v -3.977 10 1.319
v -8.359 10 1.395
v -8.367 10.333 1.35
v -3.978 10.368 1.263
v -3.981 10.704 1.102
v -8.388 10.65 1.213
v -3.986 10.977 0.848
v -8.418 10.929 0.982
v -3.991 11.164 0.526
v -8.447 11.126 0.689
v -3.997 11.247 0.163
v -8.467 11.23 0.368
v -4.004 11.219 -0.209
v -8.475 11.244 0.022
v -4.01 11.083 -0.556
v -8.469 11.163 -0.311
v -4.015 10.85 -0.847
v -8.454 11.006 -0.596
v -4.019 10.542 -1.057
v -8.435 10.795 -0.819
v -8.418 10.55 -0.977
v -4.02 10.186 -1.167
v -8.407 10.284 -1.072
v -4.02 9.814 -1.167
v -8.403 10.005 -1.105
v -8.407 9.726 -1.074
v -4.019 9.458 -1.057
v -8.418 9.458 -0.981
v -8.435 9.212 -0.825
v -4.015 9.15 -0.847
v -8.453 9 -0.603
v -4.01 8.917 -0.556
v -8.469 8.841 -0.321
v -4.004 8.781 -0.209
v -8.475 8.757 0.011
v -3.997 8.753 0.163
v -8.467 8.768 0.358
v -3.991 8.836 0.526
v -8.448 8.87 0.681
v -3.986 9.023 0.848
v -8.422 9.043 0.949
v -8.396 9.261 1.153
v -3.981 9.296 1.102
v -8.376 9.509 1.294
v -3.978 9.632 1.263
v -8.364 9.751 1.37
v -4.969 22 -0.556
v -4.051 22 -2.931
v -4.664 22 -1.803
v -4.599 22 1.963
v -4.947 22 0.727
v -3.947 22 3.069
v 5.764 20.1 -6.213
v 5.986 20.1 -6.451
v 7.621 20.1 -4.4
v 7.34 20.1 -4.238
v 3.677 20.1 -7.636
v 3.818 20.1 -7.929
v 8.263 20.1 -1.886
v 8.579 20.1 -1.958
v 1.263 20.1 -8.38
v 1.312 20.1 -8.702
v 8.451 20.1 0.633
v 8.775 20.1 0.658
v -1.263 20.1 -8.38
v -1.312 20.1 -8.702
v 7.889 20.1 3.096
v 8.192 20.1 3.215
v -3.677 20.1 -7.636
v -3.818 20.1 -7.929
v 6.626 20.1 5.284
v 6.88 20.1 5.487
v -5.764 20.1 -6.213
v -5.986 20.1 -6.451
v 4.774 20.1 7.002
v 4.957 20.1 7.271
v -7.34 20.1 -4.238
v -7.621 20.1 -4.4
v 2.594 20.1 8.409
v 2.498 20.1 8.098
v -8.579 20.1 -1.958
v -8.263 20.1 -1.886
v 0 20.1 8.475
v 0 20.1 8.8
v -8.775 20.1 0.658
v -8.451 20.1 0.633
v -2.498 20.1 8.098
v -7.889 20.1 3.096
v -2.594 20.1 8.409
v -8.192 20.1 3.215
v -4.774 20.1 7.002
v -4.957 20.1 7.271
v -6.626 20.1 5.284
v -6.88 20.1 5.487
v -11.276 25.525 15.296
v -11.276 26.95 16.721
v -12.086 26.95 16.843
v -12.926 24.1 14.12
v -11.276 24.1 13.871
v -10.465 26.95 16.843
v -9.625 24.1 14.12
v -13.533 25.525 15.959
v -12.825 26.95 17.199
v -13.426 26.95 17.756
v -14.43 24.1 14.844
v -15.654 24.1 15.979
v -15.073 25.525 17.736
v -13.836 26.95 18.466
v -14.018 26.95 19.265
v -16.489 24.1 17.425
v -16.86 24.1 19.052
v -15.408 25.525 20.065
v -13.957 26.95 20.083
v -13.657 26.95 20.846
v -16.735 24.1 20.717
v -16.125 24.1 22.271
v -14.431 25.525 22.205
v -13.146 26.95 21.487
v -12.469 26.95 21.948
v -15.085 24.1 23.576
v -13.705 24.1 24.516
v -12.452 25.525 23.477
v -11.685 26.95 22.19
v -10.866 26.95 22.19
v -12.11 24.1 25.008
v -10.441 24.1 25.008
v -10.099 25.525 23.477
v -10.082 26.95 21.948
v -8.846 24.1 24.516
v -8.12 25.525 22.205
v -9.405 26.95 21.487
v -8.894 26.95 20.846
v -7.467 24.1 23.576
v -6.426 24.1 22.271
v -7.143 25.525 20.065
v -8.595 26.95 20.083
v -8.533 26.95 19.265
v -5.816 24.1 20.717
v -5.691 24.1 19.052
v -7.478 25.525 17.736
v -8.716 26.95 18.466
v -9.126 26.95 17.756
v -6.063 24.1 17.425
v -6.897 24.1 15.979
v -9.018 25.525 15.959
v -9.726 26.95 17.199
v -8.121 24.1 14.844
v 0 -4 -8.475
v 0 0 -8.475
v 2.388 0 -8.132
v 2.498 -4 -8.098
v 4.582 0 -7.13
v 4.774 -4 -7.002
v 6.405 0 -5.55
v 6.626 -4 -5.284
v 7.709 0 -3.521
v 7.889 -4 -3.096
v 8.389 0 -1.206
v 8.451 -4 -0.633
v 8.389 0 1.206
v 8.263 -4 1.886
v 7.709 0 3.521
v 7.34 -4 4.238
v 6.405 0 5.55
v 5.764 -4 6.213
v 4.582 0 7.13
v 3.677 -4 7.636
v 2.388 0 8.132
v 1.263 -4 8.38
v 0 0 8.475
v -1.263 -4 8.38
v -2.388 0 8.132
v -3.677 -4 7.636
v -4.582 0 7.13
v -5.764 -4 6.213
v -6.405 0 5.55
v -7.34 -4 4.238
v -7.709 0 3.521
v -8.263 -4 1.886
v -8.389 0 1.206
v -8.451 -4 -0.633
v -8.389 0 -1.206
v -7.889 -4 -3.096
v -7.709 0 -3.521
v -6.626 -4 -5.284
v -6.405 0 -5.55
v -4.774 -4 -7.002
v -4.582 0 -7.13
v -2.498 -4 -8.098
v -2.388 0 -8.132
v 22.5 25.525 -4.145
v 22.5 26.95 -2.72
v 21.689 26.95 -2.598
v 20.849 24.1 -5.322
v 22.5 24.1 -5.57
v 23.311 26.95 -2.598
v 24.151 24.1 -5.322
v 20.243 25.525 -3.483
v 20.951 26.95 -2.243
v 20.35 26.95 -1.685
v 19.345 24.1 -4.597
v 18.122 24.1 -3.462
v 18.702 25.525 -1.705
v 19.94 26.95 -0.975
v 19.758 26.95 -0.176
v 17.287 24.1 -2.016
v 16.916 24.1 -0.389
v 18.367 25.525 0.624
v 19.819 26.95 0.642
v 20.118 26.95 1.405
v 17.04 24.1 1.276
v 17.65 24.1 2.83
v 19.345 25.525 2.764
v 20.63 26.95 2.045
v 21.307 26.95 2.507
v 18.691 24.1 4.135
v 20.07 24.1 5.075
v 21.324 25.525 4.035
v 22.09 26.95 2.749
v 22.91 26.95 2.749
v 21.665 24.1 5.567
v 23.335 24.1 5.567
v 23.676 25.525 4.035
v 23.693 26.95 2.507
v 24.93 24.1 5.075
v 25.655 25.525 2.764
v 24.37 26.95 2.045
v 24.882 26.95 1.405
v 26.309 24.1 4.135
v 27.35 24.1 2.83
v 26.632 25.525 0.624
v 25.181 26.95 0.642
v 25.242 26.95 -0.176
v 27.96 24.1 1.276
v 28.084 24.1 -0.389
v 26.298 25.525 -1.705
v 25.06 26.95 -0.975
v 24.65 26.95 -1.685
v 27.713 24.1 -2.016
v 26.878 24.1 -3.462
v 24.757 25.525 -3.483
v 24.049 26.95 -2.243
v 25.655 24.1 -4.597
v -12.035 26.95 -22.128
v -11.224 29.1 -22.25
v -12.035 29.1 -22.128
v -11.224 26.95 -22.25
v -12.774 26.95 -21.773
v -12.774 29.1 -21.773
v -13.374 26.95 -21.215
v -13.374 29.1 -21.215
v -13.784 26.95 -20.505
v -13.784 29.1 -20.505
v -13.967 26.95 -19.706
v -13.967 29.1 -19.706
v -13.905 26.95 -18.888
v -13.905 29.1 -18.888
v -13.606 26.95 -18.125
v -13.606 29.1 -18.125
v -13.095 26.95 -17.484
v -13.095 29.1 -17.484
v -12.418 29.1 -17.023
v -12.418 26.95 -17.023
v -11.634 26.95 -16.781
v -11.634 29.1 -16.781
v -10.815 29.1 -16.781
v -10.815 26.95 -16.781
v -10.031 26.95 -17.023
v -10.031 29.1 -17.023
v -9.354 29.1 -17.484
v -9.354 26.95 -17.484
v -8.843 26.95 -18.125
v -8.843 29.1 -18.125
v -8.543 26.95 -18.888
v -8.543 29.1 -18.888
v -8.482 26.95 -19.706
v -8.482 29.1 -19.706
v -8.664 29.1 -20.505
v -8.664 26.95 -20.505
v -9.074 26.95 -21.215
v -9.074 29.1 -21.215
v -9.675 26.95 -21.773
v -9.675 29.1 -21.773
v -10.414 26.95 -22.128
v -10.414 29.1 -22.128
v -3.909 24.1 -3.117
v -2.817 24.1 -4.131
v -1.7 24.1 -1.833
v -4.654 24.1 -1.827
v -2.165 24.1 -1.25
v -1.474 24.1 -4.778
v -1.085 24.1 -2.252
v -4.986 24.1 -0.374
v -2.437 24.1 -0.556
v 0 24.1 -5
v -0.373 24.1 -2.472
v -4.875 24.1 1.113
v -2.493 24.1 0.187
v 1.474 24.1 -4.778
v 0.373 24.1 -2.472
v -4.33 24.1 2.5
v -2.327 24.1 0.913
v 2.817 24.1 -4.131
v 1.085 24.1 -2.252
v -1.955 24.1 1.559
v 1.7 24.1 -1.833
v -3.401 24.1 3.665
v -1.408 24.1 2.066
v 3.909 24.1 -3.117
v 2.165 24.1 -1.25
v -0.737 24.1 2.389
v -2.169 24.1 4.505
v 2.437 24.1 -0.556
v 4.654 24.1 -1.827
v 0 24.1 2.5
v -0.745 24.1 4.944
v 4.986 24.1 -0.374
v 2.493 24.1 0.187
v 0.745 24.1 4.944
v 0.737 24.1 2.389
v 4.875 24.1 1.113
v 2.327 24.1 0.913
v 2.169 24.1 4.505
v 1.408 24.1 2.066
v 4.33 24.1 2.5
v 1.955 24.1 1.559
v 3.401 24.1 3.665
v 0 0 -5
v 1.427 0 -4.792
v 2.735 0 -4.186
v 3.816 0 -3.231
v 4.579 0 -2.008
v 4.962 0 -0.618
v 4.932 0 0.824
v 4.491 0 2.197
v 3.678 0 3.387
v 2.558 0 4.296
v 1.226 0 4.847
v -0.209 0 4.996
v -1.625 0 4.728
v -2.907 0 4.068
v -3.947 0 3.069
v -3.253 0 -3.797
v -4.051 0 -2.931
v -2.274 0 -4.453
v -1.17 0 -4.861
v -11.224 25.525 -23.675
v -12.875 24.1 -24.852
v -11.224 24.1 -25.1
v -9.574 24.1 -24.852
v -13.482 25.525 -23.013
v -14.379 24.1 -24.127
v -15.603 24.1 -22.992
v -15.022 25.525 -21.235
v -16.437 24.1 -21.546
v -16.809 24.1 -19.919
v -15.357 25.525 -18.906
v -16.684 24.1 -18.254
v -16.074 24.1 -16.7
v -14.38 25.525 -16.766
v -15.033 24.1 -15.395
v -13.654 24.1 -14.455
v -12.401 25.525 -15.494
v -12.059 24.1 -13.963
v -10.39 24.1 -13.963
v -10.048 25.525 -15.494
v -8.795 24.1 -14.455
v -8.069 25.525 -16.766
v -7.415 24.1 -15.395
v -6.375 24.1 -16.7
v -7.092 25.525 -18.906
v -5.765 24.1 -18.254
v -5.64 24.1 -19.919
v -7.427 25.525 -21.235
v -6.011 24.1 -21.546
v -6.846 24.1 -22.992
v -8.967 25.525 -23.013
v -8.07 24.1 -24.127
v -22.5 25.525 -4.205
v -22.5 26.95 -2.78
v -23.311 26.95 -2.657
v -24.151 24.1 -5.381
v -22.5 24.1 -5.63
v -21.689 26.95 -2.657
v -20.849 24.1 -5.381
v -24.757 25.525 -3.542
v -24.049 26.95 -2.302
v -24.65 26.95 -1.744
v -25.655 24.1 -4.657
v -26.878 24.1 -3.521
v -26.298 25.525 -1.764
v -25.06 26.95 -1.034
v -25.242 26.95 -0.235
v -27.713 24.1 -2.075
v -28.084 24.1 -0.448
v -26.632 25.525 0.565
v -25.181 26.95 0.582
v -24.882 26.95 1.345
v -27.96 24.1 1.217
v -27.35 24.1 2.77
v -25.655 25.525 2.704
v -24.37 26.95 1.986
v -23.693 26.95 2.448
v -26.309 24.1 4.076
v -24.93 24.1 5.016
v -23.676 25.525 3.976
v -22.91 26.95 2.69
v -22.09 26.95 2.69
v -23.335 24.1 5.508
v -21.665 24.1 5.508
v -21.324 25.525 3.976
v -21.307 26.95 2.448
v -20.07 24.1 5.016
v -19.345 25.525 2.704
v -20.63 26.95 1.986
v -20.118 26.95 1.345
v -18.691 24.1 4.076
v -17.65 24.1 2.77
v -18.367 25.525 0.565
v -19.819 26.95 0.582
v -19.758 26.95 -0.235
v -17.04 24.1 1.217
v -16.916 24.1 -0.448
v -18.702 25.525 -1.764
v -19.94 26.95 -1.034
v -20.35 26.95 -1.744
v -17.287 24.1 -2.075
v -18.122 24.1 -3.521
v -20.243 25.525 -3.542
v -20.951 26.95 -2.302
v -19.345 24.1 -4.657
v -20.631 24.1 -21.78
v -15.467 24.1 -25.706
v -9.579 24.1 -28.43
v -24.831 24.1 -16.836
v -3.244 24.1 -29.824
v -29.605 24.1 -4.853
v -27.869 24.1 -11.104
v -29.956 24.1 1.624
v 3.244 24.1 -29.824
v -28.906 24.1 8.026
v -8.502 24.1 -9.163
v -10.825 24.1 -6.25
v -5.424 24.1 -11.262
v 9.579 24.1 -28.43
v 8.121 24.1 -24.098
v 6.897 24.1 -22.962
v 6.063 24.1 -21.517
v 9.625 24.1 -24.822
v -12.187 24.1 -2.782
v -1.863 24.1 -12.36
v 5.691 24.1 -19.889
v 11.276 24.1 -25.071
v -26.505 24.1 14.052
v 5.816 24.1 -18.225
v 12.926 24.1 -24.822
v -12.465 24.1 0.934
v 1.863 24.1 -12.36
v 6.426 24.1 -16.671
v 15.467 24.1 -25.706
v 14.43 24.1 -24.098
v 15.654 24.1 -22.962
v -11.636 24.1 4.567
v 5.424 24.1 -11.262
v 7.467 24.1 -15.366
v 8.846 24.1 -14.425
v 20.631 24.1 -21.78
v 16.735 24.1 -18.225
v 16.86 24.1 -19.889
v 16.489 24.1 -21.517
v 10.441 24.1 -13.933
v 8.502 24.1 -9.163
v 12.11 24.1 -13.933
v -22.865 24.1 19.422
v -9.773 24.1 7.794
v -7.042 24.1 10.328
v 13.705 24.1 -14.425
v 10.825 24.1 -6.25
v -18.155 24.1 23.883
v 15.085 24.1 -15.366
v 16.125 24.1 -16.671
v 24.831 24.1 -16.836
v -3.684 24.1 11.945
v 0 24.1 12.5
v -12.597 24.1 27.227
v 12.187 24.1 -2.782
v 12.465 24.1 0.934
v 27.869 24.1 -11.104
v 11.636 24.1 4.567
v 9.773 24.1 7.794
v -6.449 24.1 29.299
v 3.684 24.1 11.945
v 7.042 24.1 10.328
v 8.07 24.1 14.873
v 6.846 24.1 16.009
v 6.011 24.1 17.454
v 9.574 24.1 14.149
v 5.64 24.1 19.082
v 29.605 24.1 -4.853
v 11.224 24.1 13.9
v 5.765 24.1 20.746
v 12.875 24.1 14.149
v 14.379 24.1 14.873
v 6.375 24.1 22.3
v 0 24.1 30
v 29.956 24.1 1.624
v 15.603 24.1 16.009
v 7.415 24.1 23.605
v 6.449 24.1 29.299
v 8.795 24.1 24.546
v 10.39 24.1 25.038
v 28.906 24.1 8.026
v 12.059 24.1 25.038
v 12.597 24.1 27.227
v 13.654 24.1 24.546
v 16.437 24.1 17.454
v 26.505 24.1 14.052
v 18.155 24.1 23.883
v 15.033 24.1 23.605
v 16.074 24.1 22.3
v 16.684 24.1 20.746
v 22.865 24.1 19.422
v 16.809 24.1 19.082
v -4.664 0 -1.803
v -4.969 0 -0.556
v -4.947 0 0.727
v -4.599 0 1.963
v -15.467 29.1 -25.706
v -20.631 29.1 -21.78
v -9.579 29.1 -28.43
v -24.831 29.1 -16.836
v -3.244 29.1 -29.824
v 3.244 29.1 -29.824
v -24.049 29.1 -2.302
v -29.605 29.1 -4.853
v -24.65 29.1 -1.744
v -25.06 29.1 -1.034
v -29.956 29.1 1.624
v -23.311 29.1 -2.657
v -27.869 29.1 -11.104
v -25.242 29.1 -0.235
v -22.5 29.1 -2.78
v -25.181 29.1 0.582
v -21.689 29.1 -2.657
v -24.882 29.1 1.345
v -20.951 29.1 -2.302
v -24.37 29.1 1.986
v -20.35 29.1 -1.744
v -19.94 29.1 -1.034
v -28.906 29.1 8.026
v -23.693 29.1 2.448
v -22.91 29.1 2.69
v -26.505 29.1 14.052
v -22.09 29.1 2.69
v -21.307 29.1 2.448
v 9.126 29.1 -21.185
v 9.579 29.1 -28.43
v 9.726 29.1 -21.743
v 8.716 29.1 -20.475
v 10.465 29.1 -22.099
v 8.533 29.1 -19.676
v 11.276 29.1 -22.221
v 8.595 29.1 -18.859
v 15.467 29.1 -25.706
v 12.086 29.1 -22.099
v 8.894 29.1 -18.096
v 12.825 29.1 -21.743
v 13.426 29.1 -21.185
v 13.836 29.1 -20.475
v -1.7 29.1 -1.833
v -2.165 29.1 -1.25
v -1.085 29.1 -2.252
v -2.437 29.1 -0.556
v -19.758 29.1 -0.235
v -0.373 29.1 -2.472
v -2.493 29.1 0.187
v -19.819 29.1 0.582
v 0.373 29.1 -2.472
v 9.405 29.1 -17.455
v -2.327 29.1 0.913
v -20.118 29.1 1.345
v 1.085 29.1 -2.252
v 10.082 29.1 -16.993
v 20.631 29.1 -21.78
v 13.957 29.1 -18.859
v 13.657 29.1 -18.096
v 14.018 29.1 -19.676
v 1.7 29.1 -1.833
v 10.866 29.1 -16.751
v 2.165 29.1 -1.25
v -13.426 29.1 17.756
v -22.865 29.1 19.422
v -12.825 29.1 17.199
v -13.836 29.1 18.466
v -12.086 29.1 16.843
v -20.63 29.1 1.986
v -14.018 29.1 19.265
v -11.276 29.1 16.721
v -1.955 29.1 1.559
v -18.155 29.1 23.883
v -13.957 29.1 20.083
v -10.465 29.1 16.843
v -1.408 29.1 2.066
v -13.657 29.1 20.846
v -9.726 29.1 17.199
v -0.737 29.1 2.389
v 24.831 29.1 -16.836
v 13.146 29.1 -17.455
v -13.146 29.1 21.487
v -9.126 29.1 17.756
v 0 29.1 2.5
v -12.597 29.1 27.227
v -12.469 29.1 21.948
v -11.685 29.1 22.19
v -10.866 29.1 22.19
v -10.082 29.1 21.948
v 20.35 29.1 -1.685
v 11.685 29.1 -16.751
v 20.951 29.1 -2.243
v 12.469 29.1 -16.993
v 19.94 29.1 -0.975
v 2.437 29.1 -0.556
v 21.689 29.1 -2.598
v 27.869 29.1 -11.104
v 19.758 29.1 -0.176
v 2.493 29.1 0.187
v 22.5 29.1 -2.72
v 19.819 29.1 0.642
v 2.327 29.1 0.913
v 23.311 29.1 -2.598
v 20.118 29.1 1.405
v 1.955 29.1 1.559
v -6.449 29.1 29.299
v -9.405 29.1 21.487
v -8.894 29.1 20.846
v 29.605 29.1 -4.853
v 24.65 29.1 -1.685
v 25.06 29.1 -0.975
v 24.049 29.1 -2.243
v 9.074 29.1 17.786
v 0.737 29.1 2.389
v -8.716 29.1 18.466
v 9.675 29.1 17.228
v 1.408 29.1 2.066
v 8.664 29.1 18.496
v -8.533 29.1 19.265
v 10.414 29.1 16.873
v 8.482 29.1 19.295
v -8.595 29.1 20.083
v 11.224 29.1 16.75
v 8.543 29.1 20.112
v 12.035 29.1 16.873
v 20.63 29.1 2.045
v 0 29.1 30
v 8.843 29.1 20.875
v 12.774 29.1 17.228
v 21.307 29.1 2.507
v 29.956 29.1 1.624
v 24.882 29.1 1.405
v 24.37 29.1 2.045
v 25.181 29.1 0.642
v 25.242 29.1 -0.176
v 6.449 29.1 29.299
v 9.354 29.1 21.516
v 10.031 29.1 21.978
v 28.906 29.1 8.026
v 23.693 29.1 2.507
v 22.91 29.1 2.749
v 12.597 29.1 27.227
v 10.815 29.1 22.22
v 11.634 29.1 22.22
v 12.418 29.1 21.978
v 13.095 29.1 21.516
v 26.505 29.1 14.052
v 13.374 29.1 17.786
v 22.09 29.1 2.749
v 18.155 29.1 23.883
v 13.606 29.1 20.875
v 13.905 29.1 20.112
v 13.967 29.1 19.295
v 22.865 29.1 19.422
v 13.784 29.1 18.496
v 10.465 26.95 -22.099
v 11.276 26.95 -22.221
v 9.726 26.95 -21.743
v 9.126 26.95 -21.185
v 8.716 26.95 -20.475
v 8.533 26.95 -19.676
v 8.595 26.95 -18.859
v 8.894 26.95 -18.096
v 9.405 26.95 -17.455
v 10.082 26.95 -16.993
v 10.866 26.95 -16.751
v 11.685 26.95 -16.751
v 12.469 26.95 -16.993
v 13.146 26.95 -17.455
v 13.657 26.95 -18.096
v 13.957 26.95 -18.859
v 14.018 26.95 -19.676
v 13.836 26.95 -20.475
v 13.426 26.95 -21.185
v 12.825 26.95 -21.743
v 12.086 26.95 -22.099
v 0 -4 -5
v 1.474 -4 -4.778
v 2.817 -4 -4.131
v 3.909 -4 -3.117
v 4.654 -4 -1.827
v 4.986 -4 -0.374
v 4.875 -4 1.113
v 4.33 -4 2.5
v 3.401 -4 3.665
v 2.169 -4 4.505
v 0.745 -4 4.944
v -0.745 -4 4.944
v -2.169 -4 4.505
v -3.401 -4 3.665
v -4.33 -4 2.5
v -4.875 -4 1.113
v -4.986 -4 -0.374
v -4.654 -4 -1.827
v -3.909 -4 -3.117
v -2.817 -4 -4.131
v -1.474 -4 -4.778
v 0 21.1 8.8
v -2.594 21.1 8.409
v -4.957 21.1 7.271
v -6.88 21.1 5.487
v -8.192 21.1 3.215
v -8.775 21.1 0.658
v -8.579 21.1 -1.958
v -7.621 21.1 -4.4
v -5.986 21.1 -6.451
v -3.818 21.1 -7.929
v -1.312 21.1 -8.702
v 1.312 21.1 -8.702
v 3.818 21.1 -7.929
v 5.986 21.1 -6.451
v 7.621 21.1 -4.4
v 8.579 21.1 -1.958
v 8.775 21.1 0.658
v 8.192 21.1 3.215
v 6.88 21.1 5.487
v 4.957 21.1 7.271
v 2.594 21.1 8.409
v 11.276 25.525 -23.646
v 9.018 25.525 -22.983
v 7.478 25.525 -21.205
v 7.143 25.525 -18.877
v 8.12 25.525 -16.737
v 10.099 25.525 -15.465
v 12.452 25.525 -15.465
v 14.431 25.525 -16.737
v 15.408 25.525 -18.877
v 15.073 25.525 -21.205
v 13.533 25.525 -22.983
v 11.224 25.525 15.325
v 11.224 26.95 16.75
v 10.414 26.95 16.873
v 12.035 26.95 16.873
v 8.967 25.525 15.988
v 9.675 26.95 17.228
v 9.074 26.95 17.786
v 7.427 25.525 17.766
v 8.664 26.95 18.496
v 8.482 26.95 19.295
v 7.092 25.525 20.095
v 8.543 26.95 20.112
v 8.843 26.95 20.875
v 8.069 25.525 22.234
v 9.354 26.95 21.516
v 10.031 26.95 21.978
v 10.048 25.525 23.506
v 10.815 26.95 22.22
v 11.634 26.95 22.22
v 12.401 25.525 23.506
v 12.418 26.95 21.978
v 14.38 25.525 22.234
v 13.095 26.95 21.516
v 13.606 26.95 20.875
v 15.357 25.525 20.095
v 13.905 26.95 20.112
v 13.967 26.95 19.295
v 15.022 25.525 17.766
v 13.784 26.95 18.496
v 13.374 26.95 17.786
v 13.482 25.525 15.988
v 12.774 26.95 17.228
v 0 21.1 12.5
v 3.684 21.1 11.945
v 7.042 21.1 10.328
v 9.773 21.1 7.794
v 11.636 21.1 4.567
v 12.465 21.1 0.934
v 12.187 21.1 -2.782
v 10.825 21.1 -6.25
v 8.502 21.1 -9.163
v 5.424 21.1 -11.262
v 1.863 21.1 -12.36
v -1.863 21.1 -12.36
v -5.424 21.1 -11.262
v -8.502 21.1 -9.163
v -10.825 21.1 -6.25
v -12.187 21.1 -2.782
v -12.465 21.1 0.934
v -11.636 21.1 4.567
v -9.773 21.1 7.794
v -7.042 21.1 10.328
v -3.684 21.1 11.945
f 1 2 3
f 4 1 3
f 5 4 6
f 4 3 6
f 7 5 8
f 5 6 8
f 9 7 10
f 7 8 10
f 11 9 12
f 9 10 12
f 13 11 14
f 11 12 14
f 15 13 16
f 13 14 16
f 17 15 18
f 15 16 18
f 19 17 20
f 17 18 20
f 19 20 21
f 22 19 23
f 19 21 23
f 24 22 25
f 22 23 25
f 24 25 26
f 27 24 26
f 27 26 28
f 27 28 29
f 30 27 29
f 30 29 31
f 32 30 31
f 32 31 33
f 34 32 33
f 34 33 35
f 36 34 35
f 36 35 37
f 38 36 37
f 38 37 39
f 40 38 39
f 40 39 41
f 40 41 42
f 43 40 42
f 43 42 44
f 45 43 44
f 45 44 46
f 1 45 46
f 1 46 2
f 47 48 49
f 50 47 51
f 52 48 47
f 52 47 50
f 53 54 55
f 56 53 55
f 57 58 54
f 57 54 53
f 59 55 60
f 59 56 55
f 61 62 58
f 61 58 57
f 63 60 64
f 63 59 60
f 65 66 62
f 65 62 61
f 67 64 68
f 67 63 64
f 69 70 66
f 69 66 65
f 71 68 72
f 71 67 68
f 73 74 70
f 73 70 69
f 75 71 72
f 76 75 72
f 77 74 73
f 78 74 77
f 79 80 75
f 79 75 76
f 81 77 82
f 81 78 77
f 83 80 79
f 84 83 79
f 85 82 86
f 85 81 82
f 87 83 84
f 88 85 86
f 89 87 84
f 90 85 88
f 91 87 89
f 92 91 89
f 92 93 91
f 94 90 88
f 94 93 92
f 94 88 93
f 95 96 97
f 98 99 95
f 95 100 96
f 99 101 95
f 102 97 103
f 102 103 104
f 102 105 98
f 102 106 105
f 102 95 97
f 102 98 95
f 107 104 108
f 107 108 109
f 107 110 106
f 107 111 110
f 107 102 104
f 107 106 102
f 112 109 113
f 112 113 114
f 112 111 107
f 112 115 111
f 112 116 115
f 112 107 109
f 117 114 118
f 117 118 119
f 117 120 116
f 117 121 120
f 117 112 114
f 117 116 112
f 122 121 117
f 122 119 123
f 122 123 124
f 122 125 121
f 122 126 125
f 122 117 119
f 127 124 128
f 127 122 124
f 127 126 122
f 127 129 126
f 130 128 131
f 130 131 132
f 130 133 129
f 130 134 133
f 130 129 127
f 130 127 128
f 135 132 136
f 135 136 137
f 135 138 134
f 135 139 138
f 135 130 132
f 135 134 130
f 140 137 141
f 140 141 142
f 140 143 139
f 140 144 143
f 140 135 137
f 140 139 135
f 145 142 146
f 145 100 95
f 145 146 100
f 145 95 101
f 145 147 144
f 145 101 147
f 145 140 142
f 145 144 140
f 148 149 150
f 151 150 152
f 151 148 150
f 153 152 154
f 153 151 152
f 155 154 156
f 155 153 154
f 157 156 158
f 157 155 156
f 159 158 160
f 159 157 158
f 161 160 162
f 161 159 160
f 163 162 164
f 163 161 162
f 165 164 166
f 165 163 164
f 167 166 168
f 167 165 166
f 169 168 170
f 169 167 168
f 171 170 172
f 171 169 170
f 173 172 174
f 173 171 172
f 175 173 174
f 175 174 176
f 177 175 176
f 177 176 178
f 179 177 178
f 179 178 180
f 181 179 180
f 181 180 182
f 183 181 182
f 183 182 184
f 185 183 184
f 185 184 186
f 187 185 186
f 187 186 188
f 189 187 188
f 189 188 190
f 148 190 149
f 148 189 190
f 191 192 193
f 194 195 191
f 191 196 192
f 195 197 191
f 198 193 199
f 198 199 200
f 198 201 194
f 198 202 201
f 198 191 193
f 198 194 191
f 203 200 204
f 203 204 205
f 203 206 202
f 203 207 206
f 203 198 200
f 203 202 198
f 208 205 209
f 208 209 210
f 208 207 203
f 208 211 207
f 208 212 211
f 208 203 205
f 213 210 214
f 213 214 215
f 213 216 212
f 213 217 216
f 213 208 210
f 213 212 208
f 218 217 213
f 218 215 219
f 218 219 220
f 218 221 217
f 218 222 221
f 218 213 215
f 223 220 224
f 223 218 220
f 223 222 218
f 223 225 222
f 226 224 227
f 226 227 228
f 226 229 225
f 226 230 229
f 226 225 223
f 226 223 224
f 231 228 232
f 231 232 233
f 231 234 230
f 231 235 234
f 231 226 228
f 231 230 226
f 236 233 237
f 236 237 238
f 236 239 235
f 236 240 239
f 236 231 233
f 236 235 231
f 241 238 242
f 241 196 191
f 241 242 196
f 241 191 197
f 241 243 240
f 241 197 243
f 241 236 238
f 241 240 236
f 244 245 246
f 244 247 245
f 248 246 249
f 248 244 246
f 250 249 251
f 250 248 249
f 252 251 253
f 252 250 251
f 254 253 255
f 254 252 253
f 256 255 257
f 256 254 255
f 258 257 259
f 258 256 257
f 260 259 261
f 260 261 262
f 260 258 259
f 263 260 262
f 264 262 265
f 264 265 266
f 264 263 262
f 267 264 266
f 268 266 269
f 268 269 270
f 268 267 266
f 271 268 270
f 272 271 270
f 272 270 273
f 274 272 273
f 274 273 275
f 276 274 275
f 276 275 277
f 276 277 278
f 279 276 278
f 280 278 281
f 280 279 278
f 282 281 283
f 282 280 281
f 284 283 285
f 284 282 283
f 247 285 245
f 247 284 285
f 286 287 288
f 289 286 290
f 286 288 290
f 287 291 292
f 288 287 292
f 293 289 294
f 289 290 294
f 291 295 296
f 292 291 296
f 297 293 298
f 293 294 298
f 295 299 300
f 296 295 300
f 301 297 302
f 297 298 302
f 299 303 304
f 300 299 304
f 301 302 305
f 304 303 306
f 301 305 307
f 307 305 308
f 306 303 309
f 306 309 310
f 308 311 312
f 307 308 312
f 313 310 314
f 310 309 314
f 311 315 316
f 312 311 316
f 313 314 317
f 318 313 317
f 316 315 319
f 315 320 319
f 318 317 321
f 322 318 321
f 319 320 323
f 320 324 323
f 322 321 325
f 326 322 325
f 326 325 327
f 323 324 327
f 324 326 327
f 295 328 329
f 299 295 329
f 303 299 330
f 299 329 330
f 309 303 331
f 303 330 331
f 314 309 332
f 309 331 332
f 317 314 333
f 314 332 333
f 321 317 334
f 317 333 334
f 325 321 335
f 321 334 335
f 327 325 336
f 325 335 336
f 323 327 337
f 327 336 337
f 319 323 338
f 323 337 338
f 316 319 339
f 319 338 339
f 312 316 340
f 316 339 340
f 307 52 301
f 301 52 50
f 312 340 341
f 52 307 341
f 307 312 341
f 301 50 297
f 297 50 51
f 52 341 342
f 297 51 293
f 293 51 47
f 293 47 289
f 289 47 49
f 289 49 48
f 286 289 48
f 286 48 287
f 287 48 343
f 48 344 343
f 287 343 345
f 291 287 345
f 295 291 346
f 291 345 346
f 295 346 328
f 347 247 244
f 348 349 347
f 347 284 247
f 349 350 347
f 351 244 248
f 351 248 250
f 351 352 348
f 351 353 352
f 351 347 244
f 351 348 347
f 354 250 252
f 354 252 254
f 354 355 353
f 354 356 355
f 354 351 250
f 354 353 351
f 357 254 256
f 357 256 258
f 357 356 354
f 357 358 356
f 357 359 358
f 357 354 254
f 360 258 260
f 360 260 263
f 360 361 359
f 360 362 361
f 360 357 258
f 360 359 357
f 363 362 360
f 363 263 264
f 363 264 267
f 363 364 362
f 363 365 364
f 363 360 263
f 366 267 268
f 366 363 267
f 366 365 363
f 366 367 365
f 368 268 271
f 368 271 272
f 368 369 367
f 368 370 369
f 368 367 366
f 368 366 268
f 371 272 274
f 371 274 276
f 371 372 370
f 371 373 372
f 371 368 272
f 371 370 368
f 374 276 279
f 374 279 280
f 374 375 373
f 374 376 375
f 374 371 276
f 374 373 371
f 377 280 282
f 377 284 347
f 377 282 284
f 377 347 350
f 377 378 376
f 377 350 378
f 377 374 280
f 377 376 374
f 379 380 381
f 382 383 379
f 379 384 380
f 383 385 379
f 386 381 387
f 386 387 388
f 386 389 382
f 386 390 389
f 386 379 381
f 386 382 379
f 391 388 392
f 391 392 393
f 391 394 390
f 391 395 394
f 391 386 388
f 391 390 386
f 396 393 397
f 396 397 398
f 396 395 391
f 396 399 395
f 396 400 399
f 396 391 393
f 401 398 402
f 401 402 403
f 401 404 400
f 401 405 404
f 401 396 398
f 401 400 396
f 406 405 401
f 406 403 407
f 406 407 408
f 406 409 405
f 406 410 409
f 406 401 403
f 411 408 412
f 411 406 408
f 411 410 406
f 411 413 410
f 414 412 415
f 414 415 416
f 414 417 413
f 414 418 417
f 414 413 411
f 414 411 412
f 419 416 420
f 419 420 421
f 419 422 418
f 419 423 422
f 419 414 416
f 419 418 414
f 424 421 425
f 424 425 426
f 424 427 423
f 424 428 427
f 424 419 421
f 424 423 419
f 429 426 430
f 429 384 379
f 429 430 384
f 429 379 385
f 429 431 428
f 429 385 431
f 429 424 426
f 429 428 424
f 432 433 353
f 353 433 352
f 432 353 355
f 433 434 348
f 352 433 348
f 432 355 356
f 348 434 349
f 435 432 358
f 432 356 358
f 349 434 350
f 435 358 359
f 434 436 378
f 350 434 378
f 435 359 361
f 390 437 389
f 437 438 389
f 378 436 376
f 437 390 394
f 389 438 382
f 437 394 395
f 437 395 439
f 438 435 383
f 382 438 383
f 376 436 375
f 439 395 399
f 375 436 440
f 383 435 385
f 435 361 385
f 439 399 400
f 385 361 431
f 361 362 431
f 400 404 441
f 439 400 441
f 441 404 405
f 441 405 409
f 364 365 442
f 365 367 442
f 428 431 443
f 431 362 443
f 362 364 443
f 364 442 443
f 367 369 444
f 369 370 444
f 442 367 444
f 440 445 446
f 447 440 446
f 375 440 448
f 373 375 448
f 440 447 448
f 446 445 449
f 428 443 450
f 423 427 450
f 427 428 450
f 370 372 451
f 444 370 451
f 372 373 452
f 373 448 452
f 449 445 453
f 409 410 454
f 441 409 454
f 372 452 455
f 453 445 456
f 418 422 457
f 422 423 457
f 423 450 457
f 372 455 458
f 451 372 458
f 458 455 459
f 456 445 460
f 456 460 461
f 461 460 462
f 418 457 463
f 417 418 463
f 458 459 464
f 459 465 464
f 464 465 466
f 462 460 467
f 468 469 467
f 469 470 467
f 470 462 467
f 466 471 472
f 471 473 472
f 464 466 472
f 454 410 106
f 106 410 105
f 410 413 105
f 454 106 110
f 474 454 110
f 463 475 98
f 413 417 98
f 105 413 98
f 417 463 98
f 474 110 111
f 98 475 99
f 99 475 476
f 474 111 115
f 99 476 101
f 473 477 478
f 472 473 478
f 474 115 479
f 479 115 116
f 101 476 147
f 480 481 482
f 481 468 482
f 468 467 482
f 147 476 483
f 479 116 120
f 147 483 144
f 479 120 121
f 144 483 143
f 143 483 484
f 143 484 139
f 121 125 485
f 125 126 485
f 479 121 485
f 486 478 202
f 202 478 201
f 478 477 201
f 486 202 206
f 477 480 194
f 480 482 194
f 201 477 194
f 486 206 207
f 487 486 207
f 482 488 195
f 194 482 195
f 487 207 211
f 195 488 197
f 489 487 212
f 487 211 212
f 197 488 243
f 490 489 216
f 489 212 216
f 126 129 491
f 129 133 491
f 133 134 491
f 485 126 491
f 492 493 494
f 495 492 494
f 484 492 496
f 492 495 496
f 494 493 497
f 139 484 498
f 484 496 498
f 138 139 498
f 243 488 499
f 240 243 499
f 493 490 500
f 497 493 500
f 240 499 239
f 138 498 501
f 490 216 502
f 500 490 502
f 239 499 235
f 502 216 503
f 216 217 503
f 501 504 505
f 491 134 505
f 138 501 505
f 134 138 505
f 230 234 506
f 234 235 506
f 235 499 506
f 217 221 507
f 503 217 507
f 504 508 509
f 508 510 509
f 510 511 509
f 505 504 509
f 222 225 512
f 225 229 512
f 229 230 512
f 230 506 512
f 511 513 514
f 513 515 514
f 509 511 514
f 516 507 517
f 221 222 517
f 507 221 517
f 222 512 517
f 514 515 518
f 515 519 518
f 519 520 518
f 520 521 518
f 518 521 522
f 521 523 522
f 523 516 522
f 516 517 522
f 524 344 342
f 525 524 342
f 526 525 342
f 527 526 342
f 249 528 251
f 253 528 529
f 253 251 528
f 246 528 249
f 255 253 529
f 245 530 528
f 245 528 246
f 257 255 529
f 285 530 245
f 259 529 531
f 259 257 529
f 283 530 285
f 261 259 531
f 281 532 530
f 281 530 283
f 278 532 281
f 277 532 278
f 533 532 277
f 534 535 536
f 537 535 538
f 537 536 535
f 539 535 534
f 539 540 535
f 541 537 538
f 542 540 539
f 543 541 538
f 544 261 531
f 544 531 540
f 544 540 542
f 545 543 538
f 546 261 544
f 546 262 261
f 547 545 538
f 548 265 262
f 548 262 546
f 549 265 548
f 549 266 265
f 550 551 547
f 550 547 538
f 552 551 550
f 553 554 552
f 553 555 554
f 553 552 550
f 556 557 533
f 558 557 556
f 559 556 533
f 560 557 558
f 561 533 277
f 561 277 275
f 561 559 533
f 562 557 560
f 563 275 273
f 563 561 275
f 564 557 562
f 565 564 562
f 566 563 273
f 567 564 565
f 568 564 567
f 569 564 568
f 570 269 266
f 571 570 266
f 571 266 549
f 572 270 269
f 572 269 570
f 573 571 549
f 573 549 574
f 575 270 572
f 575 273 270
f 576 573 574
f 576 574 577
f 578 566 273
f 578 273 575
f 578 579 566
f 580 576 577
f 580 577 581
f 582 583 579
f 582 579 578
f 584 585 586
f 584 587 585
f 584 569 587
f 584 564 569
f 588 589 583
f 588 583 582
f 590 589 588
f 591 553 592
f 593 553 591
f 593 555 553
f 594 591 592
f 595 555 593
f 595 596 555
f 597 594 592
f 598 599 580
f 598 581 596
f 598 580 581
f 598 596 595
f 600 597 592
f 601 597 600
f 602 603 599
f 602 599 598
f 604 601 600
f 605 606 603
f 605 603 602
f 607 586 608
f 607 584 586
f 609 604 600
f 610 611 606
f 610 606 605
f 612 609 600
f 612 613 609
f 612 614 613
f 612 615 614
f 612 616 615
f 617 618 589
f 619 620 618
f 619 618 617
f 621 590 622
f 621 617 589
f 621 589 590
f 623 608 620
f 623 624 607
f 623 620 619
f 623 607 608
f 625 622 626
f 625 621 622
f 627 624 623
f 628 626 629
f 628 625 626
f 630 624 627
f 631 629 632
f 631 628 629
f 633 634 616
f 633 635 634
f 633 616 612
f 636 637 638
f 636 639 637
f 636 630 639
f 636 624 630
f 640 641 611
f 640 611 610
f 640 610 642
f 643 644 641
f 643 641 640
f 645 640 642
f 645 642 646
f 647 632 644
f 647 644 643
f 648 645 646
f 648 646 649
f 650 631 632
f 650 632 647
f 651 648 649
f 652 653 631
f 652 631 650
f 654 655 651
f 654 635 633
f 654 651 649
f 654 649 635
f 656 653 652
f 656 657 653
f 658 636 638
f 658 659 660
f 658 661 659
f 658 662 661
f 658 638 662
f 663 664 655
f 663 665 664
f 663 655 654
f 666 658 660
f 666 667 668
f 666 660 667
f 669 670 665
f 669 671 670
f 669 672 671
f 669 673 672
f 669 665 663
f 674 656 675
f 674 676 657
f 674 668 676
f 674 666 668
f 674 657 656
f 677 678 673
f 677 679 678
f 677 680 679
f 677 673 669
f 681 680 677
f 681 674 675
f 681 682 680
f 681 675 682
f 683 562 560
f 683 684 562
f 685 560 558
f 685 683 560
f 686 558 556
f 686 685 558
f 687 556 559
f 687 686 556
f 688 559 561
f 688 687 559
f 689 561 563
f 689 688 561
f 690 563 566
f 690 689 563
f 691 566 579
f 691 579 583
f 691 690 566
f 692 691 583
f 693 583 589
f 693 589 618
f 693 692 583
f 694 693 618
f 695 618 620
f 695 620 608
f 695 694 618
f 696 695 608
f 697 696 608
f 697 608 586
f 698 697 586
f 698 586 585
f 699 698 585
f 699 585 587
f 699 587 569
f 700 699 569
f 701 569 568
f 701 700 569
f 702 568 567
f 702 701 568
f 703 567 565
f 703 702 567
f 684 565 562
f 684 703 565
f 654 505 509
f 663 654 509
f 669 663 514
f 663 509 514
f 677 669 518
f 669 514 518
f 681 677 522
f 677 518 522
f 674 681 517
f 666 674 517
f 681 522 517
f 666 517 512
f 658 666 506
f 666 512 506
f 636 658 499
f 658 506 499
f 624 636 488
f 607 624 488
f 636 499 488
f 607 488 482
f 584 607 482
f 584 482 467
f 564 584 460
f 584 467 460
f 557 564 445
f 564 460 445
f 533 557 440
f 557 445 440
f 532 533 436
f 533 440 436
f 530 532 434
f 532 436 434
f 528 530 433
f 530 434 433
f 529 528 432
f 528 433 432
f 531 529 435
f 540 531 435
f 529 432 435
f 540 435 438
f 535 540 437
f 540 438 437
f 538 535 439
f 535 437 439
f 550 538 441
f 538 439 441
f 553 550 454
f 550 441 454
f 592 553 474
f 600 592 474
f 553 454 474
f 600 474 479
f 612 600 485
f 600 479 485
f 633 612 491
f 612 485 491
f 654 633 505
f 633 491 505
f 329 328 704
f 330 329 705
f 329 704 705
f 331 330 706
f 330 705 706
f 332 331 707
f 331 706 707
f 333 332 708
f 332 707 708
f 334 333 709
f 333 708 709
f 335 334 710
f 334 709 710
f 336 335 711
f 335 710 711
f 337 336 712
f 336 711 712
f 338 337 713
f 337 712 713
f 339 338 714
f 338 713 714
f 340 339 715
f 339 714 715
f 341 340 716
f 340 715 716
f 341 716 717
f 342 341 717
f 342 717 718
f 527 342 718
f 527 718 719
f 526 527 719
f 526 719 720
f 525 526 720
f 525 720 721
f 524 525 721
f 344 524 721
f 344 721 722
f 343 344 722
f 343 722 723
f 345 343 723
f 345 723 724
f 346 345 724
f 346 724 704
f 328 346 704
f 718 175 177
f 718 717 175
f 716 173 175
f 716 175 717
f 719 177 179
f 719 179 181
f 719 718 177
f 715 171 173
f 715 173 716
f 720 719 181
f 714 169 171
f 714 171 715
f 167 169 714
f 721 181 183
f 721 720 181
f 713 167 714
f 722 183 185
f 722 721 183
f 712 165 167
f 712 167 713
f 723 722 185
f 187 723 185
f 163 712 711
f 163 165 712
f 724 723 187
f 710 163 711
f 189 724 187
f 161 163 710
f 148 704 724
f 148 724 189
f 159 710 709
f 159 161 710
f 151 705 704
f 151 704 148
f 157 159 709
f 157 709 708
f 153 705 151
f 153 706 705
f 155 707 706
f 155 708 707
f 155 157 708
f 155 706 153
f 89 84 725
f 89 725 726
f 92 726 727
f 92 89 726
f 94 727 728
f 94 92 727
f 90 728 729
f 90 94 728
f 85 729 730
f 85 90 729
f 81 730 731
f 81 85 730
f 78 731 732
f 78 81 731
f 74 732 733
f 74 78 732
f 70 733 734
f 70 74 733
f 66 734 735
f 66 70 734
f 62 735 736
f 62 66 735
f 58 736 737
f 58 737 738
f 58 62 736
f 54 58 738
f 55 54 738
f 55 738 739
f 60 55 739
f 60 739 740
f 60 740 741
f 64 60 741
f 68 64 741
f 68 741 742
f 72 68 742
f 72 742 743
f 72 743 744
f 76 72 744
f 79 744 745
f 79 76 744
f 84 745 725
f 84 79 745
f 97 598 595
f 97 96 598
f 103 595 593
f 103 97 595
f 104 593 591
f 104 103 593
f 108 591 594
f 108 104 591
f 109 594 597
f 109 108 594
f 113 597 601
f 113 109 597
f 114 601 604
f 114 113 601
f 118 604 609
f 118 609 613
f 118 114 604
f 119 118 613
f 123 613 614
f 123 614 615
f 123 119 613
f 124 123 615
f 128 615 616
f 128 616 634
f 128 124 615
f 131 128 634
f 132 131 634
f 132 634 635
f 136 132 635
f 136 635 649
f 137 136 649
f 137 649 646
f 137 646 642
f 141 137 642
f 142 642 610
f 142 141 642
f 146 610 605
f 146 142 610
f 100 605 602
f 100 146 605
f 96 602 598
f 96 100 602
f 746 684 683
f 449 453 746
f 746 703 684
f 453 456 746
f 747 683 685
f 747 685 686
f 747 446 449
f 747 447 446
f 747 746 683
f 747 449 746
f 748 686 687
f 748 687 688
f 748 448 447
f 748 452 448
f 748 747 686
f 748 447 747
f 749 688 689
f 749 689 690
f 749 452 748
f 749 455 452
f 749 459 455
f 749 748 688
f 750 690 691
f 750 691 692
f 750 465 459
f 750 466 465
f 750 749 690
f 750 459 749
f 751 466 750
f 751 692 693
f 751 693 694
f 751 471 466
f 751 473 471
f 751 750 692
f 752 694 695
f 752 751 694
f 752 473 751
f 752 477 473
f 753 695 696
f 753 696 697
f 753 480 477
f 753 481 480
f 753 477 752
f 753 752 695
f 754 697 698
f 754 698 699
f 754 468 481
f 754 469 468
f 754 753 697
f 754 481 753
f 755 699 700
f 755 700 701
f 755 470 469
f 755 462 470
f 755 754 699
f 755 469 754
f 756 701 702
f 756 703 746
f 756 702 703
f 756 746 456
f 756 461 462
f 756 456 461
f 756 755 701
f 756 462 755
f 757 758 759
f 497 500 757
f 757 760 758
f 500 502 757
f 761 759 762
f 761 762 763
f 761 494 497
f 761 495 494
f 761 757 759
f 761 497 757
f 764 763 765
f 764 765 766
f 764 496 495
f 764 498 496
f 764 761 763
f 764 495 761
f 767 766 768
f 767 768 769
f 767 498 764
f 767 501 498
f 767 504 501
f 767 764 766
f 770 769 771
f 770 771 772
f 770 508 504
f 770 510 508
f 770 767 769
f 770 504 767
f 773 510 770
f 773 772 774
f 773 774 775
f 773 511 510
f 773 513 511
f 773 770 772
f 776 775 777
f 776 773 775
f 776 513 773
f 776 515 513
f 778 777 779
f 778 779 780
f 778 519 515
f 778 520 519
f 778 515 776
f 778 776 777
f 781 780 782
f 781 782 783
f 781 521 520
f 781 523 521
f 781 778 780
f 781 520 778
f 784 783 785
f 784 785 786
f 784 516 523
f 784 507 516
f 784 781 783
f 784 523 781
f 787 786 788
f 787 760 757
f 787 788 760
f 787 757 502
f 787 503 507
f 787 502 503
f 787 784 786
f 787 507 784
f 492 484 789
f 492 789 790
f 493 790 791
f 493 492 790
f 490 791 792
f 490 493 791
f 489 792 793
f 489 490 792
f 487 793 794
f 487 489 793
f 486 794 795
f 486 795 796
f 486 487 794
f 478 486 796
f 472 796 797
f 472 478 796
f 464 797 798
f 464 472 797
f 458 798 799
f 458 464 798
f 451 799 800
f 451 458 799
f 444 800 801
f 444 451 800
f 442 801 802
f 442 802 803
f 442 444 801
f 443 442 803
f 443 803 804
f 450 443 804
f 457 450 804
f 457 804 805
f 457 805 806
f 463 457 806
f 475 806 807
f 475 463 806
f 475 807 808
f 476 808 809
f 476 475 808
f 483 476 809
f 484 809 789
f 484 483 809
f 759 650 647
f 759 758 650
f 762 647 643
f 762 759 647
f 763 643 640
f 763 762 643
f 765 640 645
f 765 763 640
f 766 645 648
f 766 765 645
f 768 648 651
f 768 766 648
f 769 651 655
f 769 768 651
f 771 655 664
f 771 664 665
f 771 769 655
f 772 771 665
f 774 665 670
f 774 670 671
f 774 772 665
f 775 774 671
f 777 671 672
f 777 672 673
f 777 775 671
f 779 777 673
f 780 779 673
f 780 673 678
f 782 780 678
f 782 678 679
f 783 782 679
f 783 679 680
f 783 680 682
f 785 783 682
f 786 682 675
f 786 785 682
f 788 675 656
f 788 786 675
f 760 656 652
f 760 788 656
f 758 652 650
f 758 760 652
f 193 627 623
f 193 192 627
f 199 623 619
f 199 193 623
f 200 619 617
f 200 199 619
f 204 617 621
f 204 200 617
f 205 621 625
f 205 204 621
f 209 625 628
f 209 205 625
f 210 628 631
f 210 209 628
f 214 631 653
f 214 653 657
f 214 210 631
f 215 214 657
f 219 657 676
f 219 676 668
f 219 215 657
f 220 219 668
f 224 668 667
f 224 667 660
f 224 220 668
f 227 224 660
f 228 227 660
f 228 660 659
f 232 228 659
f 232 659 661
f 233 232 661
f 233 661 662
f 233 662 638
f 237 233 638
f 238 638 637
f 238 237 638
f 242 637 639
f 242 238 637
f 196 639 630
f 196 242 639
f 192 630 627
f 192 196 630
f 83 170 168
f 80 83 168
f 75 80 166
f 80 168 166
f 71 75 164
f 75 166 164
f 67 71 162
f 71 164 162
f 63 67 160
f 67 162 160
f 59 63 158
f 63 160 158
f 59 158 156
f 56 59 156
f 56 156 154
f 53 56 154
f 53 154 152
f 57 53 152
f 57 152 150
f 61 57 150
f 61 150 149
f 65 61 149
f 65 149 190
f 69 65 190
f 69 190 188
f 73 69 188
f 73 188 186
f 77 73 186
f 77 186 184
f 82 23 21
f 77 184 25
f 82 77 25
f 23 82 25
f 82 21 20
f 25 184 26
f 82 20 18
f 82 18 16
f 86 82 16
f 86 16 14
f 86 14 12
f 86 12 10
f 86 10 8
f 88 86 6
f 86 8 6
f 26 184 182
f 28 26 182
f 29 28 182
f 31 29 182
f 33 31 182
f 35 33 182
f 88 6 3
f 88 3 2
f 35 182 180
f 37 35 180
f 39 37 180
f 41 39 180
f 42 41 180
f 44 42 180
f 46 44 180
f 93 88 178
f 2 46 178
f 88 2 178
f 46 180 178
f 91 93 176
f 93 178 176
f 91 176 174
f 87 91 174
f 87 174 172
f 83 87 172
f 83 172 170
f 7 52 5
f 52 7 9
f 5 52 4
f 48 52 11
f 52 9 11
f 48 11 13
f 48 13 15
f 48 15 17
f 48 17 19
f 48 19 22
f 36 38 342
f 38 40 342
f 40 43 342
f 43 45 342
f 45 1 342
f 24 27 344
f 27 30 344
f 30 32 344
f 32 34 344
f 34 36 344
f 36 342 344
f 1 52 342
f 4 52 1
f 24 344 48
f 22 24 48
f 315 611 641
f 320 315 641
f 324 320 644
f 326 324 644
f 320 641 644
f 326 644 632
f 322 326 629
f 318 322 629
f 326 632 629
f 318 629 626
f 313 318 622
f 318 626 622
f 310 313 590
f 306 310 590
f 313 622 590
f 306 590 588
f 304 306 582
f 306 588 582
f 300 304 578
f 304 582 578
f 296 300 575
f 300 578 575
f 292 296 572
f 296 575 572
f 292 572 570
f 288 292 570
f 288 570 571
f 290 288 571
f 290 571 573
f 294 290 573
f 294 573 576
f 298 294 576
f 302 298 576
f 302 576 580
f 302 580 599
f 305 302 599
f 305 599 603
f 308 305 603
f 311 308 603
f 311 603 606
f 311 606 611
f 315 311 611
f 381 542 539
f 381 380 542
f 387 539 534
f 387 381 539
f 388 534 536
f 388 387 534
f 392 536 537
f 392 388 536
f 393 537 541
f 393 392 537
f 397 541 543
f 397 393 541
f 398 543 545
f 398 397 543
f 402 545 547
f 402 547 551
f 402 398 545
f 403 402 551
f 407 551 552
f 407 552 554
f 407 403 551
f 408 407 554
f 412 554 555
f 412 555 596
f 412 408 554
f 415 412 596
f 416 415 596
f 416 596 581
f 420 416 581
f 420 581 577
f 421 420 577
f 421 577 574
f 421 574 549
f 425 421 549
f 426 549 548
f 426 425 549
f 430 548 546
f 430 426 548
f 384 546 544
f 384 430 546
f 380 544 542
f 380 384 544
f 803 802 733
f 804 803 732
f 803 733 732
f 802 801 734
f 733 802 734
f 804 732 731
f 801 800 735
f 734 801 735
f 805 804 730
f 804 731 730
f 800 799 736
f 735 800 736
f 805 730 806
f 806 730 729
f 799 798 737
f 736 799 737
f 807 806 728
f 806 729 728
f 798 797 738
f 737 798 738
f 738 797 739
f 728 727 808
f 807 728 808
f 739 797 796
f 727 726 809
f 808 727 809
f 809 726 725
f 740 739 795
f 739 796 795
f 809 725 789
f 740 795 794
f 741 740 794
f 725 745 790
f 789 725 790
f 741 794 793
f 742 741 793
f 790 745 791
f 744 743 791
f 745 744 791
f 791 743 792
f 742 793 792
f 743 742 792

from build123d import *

# Parameters (mm, degrees)
SKETCH_1_R               = 8.475
EXTRUDE_1_DEPTH          = 24.1
CUT_EXTRUDE_2_REACH      = 28.916
SKETCH_3_R               = 5
EXTRUDE_2_DEPTH          = 22
SKETCH_6_R               = 12.5
SKETCH_6_R_2             = 7.5
EXTRUDE_3_DEPTH          = 3
EXTRUDE_START            = 1
SKETCH_20_R              = 8.8
SKETCH_20_R_2            = 8.475
EXTRUDE_4_DEPTH          = 1
HOLE_WIZARD_M3_4_D       = 2.5
HOLE_WIZARD_M3_4_DEPTH   = 8.5
HOLE_WIZARD_M3_4_TIP     = 0.751075774
SKETCH_24_R              = 30
EXTRUDE_5_DEPTH          = 5
SKETCH_25_R              = 2.5
CUT_EXTRUDE_3_DEPTH      = 10
HOLE_WIZARD_1_AT_2_COUNT = 2
HOLE_WIZARD_1_AT_2_PITCH = 22.5
HOLE_WIZARD_1_AT_3_COUNT = 2
HOLE_WIZARD_1_AT_3_PITCH = 38.97114317
HOLE_WIZARD_1_AT_4_COUNT = 2
HOLE_WIZARD_1_AT_4_PITCH = 45
HOLE_WIZARD_1_AT_5_COUNT = 2
HOLE_WIZARD_1_AT_5_PITCH = 38.97114317
HOLE_WIZARD_1_AT_6_COUNT = 2
HOLE_WIZARD_1_AT_6_PITCH = 22.5
EXTRUDE_START_2          = 4
SKETCH_34_R              = 8.475
SKETCH_34_R_2            = 5
EXTRUDE_8_DEPTH          = 4


with BuildPart() as part:
    # 草图1 → 凸台-拉伸1 (new body)
    with BuildSketch(Plane(origin=(0, 0, 0), x_dir=(1, 0, 0), z_dir=(0, 1, 0))):
        with Locations(Location((0, 0, 0), (0, 0, 270))):
            Circle(SKETCH_1_R)
    extrude(amount=EXTRUDE_1_DEPTH)

    # 草图3 → 切除-拉伸2 (cut, up to next)
    with BuildSketch(Plane.XZ, mode=Mode.PRIVATE) as cut_extrude_2_sk1:
        with Locations(Location((0, 0, 0), (0, 0, 270))):
            Circle(SKETCH_3_R)
    cut_extrude_2_tool1 = extrude(cut_extrude_2_sk1.sketch, amount=-CUT_EXTRUDE_2_REACH, mode=Mode.PRIVATE) & part.part
    add(cut_extrude_2_tool1.solids().sort_by_distance((0, 0, 0))[0], mode=Mode.SUBTRACT)

    # 草图4 → 凸台-拉伸2 (add)
    with BuildSketch(Plane.XZ):
        with BuildLine():
            Line((-3.947215931, 3.069118179), (-4.050917396, -2.930881821))
            ThreePointArc((-4.050917396, -2.930881821), (-4.999253362, 0.086404983), (-3.947215931, 3.069118179))
        make_face()
    extrude(amount=-EXTRUDE_2_DEPTH)

    # 草图6 → 凸台-拉伸3 (add)
    with BuildSketch(Plane(origin=(0, 24.1, 0), x_dir=(1, 0, 0), z_dir=(0, 1, 0))):
        with Locations(Location((0, 0, 0), (0, 0, 270))):
            Circle(SKETCH_6_R)
        Circle(SKETCH_6_R_2, mode=Mode.SUBTRACT)
    extrude(amount=-EXTRUDE_3_DEPTH)

    # 草图20 → 凸台-拉伸4 (add)
    with BuildSketch(Plane.XZ.offset(-21.1).offset(EXTRUDE_START)):
        with Locations(Location((0, 0, 0), (0, 0, 90))):
            Circle(SKETCH_20_R)
        with Locations(Location((0, 0, 0), (0, 0, 270))):
            Circle(SKETCH_20_R_2, mode=Mode.SUBTRACT)
    extrude(amount=-EXTRUDE_4_DEPTH)

    # M3 螺纹孔4
    with Locations(Plane(origin=(-3.999066663, 0, 0.069118179), x_dir=(-0.01728099666811417, 0, -0.9998506724277165), z_dir=(0.9998506724277165, 0, -0.01728099666811417))):
        with Locations((0, 10)):
            Hole(HOLE_WIZARD_M3_4_D / 2, depth=HOLE_WIZARD_M3_4_DEPTH)
            with Locations((0, 0, -(HOLE_WIZARD_M3_4_DEPTH + HOLE_WIZARD_M3_4_TIP / 2))):  # 118° drill point
                Cone(0, HOLE_WIZARD_M3_4_D / 2, HOLE_WIZARD_M3_4_TIP, mode=Mode.SUBTRACT)

    # 草图24 → 凸台-拉伸5 (add)
    with BuildSketch(Plane(origin=(0, 24.1, 0), x_dir=(1, 0, 0), z_dir=(0, 1, 0))):
        with Locations(Location((0, 0, 0), (0, 0, 270))):
            Circle(SKETCH_24_R)
    extrude(amount=EXTRUDE_5_DEPTH)

    # 草图25 → 切除-拉伸3 (cut)
    with BuildSketch(Plane(origin=(0, 29.1, 0), x_dir=(1, 0, 0), z_dir=(0, 1, 0))):
        with Locations(Location((0, 0, 0), (0, 0, 270))):
            Circle(SKETCH_25_R)
    extrude(amount=-CUT_EXTRUDE_3_DEPTH, mode=Mode.SUBTRACT)

    # 草图31 → 打孔尺寸(%根据十字)槽半沉头木螺钉的类型1 (revolve, cut)
    with BuildSketch(Plane(origin=(-11.275607113, 24.1, 19.47076486), x_dir=(0, 0, -1), z_dir=(1, 0, 0))):
        Polygon((0, 0), (0, 5), (2.75, 5), (2.75, 2.85), (5.6, 0), align=None)
    hole_wizard_1 = revolve(axis=Axis((-11.275607113, 17.75, 19.47076486), (0, 1, 0)), mode=Mode.SUBTRACT)

    # 打孔尺寸(%根据十字)槽半沉头木螺钉的类型1 at 2: 打孔尺寸(%根据十字)槽半沉头木螺钉的类型1 ×2
    with Locations(*[Vector(0.9999991358386731, 0, 0.0013146565738525046) * (i * HOLE_WIZARD_1_AT_2_PITCH) for i in range(1, HOLE_WIZARD_1_AT_2_COUNT)]):
        add(hole_wizard_1, mode=Mode.SUBTRACT)

    # 打孔尺寸(%根据十字)槽半沉头木螺钉的类型1 at 3: 打孔尺寸(%根据十字)槽半沉头木螺钉的类型1 ×2
    with Locations(*[Vector(0.8666819836857027, 0, -0.49886104192912833) * (i * HOLE_WIZARD_1_AT_3_PITCH) for i in range(1, HOLE_WIZARD_1_AT_3_COUNT)]):
        add(hole_wizard_1, mode=Mode.SUBTRACT)

    # 打孔尺寸(%根据十字)槽半沉头木螺钉的类型1 at 4: 打孔尺寸(%根据十字)槽半沉头木螺钉的类型1 ×2
    with Locations(*[Vector(0.5011380939095448, 0, -0.8653673271118504) * (i * HOLE_WIZARD_1_AT_4_PITCH) for i in range(1, HOLE_WIZARD_1_AT_4_COUNT)]):
        add(hole_wizard_1, mode=Mode.SUBTRACT)

    # 打孔尺寸(%根据十字)槽半沉头木螺钉的类型1 at 5: 打孔尺寸(%根据十字)槽半沉头木螺钉的类型1 ×2
    with Locations(*[Vector(0.0013146565738523764, 0, -0.9999991358386731) * (i * HOLE_WIZARD_1_AT_5_PITCH) for i in range(1, HOLE_WIZARD_1_AT_5_COUNT)]):
        add(hole_wizard_1, mode=Mode.SUBTRACT)

    # 打孔尺寸(%根据十字)槽半沉头木螺钉的类型1 at 6: 打孔尺寸(%根据十字)槽半沉头木螺钉的类型1 ×2
    with Locations(*[Vector(-0.49886104192912806, 0, -0.8666819836857028) * (i * HOLE_WIZARD_1_AT_6_PITCH) for i in range(1, HOLE_WIZARD_1_AT_6_COUNT)]):
        add(hole_wizard_1, mode=Mode.SUBTRACT)

    # 草图34 → 凸台-拉伸8 (add)
    with BuildSketch(Plane(origin=(0, 0, 0), x_dir=(-1, 0, 0), z_dir=(0, -1, 0)).offset(EXTRUDE_START_2)):
        with Locations(Location((0, 0, 0), (0, 0, 90))):
            Circle(SKETCH_34_R)
        with Locations(Location((0, 0, 0), (0, 0, 90))):
            Circle(SKETCH_34_R_2, mode=Mode.SUBTRACT)
    extrude(amount=-EXTRUDE_8_DEPTH)


solid = part.part
